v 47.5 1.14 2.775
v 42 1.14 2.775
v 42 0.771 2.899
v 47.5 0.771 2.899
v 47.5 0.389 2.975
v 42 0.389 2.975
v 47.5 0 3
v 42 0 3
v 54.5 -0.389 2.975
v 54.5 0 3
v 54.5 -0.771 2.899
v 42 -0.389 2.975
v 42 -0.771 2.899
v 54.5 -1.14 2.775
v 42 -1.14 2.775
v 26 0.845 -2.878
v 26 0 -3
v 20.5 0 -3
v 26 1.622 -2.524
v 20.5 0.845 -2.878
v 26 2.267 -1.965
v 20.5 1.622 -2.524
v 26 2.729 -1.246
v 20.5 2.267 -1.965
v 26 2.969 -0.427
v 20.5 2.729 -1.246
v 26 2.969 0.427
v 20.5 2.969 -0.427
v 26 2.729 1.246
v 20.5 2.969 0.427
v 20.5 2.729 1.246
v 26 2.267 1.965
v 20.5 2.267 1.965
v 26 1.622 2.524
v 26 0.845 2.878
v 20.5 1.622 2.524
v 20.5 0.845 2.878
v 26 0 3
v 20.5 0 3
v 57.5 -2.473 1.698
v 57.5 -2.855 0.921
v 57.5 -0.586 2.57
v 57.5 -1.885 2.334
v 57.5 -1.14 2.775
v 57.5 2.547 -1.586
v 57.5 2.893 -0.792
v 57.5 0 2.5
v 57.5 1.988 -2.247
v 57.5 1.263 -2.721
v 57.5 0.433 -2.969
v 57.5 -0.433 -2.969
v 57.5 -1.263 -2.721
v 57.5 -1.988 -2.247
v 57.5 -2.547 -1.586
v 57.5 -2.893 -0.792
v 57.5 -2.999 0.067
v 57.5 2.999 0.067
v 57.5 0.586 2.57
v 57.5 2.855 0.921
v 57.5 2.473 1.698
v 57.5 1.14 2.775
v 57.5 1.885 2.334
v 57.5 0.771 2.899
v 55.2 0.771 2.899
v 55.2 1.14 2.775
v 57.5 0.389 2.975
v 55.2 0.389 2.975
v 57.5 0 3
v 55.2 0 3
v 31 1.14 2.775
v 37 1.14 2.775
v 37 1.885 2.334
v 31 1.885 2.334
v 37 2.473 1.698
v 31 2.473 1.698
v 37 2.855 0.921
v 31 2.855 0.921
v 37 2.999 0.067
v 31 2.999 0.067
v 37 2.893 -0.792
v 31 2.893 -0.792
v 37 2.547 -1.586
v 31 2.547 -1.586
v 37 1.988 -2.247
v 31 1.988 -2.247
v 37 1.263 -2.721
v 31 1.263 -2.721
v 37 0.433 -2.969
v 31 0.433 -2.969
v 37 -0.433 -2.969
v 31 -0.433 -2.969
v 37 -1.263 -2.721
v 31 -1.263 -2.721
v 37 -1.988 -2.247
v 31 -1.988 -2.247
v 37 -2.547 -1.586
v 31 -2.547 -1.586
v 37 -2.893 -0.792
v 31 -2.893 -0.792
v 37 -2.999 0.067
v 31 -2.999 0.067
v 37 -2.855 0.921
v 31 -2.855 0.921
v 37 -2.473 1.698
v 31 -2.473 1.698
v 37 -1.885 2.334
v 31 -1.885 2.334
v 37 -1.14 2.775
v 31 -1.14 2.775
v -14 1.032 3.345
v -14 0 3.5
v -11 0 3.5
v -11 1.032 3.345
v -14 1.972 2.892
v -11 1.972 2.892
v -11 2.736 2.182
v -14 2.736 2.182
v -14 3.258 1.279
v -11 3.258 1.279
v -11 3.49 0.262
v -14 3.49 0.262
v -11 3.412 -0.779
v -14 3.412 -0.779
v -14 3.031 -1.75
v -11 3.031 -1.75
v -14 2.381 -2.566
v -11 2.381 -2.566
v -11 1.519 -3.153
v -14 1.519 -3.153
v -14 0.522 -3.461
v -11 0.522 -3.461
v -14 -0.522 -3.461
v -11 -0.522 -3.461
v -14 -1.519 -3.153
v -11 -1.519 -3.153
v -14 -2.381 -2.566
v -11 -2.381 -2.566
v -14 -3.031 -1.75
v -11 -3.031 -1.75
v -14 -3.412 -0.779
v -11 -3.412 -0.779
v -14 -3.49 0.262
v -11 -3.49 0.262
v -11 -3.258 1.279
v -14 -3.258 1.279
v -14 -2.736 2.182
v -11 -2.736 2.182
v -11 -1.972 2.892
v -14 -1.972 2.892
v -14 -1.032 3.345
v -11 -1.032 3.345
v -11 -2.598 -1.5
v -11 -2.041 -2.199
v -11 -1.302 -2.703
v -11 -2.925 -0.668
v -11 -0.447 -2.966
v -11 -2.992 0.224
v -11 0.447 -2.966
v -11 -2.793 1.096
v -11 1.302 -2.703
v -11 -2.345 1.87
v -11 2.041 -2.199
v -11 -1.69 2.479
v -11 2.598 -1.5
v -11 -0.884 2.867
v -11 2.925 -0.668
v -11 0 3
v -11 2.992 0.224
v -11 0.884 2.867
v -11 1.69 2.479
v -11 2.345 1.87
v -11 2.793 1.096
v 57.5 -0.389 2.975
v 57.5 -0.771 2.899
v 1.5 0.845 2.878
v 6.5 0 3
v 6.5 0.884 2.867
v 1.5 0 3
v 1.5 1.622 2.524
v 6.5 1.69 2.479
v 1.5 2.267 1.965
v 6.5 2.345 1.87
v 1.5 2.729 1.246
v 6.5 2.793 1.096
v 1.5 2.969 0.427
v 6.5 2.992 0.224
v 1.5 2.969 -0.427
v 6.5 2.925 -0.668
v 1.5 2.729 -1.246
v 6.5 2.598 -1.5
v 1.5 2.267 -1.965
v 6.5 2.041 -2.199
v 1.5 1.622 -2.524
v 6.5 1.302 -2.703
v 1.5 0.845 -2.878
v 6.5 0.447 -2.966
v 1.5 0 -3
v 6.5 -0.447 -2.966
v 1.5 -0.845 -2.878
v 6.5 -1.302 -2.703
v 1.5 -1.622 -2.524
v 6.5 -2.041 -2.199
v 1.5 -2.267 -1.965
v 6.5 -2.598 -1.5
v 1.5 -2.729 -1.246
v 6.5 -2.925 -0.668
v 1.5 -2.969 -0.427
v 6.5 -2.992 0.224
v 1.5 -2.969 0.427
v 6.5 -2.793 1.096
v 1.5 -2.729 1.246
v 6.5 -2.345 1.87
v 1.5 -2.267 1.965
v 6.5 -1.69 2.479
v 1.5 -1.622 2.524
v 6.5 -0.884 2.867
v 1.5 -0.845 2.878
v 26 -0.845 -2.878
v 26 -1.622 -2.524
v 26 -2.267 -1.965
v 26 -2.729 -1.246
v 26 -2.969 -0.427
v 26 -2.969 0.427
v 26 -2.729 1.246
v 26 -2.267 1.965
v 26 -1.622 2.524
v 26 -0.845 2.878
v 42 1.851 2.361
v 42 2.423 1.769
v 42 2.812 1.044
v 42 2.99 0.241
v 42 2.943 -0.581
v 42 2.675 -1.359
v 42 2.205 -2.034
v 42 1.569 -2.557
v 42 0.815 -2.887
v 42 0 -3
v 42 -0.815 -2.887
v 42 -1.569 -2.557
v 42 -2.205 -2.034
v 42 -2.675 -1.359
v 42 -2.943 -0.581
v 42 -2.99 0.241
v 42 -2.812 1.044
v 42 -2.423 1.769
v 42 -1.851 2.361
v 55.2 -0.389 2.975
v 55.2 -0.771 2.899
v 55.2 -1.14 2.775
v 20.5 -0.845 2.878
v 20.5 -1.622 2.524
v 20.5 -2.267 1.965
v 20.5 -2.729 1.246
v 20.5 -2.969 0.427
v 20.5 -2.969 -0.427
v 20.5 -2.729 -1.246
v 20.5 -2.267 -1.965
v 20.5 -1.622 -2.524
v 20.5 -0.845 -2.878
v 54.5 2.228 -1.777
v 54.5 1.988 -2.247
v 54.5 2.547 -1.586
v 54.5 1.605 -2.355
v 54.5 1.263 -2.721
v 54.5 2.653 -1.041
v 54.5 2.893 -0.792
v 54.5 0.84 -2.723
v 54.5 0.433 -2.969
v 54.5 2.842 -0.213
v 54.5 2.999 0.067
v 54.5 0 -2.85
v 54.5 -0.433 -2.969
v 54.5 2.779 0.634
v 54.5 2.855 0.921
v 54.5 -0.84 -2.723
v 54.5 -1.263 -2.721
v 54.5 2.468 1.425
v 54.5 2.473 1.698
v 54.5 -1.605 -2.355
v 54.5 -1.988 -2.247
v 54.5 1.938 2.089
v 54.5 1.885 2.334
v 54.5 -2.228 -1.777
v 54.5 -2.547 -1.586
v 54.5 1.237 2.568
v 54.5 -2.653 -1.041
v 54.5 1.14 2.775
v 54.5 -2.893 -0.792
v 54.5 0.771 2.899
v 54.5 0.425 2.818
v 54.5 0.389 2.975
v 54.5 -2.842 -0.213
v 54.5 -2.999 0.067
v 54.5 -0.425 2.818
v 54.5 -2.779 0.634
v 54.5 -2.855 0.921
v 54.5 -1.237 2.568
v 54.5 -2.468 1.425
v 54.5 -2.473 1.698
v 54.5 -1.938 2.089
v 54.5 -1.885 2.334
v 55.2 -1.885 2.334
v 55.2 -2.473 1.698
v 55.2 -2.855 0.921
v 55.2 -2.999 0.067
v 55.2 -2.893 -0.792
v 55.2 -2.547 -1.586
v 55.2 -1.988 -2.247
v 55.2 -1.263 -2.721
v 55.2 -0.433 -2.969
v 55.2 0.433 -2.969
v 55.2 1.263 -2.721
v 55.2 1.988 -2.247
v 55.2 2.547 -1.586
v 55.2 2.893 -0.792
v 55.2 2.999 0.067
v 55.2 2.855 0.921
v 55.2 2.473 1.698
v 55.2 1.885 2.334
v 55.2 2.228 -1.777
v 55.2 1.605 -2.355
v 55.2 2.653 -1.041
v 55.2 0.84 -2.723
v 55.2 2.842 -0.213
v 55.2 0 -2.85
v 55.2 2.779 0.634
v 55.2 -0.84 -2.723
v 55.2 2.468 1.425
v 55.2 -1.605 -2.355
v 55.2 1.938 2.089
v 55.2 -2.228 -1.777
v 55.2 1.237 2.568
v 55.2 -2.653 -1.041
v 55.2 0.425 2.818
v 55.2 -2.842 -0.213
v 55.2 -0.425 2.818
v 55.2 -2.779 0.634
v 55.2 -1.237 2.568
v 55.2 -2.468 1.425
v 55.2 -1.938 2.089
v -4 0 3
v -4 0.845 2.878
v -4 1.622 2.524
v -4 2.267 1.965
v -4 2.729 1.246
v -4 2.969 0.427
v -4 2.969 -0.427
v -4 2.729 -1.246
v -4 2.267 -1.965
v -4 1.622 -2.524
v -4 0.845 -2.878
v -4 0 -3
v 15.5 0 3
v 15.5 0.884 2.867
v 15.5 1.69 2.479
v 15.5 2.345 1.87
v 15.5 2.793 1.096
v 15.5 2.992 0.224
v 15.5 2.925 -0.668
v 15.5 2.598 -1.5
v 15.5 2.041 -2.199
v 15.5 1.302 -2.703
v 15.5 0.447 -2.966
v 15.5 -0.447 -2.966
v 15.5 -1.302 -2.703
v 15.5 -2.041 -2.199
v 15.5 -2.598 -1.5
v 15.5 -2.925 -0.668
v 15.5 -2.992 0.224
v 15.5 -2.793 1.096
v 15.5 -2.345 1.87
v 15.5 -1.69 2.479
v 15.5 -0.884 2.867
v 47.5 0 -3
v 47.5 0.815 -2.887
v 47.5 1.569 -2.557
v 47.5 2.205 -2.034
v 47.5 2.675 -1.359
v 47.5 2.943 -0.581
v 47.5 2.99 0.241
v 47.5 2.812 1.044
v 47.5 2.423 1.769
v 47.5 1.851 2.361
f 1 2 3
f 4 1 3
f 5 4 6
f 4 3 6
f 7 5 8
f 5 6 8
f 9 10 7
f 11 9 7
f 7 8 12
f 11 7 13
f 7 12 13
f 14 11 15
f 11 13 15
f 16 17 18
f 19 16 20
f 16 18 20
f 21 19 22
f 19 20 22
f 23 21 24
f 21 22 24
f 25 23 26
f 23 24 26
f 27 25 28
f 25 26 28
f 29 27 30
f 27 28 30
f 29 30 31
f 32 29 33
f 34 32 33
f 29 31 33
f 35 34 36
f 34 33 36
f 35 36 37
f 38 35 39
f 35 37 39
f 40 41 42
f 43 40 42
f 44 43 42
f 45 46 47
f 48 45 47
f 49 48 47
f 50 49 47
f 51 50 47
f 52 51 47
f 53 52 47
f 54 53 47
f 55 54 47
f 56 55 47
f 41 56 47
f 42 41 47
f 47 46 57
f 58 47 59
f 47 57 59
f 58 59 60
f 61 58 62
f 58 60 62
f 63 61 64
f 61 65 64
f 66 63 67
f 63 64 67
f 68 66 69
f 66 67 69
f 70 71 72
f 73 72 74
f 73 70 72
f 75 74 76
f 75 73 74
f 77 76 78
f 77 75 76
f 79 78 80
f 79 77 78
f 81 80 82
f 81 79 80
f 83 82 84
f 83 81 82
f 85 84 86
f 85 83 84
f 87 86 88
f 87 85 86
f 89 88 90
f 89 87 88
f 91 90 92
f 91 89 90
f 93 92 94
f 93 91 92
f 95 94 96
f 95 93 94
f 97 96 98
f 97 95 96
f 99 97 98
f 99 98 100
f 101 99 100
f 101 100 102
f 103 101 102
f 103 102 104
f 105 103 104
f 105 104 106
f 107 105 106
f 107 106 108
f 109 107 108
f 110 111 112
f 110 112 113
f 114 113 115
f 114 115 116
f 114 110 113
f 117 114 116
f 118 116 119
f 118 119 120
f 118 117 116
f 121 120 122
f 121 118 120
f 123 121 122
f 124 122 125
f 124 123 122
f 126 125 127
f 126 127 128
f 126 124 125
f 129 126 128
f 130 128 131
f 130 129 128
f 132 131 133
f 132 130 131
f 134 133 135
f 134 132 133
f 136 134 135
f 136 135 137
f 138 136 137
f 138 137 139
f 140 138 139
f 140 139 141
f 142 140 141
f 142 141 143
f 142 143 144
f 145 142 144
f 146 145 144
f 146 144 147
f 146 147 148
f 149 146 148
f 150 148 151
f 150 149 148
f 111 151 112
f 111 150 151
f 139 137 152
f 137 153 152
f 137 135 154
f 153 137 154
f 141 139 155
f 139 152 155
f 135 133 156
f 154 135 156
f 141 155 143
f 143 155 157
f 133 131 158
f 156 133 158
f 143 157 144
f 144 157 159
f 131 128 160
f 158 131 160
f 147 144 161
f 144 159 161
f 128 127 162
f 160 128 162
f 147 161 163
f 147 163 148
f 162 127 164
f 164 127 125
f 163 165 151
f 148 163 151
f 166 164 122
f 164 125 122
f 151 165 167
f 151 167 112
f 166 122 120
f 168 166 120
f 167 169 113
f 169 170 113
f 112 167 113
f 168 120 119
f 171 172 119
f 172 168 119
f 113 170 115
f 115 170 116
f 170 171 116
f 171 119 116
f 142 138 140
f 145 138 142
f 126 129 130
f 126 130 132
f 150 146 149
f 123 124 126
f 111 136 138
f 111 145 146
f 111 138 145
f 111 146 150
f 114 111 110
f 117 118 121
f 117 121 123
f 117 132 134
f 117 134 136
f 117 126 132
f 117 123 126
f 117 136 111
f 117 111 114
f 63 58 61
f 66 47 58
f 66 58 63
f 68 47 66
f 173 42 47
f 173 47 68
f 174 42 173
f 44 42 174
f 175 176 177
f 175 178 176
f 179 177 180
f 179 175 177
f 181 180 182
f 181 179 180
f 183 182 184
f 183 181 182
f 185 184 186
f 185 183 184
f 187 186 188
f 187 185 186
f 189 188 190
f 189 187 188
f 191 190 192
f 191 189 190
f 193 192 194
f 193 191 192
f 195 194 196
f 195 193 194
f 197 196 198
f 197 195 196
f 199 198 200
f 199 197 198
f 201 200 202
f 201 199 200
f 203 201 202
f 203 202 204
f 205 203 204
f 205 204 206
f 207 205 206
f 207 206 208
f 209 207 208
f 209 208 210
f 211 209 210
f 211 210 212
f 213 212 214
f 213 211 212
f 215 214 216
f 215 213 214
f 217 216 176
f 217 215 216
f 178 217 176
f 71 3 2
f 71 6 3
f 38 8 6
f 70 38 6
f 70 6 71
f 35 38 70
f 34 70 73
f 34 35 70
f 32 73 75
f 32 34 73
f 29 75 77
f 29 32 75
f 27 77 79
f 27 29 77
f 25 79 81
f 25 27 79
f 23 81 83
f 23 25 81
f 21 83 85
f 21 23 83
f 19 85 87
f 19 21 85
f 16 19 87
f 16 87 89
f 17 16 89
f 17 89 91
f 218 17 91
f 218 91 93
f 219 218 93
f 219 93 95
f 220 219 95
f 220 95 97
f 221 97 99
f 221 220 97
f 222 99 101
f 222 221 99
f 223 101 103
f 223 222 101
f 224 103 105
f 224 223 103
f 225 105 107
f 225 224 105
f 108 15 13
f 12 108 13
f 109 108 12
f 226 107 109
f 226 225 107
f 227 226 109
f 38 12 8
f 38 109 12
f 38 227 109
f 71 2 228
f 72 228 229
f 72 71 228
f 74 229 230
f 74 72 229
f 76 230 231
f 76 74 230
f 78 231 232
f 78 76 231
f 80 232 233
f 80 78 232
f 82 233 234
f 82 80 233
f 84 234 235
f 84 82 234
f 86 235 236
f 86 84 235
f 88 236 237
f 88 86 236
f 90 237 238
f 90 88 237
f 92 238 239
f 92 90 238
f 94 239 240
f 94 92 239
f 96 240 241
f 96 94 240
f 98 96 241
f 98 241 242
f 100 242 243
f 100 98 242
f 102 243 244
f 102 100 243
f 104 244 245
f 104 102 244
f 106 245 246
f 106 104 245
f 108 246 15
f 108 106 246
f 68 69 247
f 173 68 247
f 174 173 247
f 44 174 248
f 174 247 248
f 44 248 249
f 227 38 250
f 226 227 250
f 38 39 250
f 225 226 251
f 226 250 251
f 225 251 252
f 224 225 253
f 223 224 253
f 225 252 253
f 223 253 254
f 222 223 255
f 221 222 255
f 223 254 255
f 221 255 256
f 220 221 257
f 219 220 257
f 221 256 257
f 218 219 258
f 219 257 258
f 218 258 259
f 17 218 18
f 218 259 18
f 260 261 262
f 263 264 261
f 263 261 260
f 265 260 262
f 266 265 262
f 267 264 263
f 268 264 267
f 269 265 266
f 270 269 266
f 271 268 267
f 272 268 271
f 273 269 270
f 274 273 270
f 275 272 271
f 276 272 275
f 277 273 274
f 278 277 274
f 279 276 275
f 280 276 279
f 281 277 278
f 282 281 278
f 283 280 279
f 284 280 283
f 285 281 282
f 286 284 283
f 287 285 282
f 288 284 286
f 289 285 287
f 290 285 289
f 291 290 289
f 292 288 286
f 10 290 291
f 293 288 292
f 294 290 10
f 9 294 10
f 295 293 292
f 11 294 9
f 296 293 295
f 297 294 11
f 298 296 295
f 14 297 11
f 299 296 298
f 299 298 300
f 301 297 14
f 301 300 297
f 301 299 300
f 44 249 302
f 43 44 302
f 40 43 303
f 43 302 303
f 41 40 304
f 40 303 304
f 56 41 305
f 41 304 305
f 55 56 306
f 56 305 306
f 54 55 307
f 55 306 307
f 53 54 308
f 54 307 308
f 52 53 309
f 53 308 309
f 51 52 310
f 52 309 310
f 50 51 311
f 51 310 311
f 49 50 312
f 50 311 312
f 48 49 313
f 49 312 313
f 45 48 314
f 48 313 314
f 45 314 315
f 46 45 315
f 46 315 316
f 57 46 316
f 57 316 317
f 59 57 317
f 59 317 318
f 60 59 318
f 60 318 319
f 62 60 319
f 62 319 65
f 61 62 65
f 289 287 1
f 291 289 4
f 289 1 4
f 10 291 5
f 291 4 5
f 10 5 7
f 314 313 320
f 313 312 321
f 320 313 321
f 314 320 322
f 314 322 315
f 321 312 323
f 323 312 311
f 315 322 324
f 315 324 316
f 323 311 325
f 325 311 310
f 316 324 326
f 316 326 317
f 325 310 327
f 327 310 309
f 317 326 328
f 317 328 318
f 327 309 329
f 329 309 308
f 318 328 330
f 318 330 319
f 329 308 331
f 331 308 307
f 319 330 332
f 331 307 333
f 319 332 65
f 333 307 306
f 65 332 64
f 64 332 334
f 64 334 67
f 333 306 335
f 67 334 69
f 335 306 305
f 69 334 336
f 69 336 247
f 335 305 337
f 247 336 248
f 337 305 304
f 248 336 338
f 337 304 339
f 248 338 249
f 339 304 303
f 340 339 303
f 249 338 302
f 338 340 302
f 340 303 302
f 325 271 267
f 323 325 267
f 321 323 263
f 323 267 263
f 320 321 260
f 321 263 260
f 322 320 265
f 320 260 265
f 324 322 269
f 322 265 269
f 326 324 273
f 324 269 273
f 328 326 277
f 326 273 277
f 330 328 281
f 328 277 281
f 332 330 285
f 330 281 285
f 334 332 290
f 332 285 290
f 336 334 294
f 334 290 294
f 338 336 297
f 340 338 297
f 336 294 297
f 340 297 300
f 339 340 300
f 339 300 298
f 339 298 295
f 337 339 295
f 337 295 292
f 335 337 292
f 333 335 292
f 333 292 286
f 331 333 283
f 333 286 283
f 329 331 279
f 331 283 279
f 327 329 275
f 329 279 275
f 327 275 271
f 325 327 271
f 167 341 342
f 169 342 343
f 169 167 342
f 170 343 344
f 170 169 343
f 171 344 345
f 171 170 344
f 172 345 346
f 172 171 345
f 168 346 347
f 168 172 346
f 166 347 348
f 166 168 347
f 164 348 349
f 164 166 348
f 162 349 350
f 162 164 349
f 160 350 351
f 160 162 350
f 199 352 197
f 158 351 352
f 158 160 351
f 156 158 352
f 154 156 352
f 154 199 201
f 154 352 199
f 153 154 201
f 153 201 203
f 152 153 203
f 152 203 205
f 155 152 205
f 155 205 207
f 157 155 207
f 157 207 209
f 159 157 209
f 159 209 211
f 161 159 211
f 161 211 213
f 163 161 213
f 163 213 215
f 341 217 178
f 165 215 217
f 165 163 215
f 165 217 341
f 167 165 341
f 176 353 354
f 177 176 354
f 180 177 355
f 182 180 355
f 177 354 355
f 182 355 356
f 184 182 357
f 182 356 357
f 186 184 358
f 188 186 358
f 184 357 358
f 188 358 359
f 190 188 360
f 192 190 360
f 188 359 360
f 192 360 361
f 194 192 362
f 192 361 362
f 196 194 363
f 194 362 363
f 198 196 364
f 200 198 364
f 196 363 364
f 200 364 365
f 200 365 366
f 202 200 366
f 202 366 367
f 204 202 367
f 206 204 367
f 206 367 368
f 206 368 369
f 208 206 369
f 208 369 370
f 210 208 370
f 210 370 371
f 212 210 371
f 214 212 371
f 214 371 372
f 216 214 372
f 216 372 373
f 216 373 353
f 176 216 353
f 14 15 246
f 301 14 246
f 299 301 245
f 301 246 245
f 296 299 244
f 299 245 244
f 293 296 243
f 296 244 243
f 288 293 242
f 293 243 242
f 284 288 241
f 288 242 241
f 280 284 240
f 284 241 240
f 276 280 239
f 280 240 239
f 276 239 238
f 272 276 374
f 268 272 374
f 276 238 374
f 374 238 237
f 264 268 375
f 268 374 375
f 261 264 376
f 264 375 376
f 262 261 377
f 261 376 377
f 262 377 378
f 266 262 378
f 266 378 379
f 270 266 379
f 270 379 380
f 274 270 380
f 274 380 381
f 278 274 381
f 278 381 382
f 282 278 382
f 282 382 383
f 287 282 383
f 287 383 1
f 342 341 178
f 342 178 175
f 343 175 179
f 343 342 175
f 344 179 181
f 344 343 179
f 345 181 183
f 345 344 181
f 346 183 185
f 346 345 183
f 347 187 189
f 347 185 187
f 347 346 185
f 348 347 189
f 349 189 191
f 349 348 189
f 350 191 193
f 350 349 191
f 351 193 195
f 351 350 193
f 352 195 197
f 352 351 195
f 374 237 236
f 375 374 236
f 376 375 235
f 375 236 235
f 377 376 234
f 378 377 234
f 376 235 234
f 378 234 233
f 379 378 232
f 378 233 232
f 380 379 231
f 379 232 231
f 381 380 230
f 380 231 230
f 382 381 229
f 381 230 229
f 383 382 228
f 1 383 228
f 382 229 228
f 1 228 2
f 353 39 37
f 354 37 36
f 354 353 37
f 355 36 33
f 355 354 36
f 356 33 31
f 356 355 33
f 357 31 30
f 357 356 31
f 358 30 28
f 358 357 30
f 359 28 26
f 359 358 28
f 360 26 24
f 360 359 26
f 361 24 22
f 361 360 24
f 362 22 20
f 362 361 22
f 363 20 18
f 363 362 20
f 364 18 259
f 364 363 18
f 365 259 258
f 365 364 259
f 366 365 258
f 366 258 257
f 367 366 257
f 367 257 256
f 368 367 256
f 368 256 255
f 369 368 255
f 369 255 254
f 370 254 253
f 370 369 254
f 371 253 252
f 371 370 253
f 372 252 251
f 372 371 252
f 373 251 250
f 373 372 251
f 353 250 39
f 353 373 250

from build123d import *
from build123d.topology import SkipClean

# Parameters (mm, degrees)
SKETCH_2_R          = 3
EXTRUDE_1_DEPTH     = 4
EXTRUDE_2_DEPTH     = 2.5
SKETCH_5_R          = 2.5
EXTRUDE_3_DEPTH     = 9
MIRROR_START        = 15.5
MIRROR_1_DEPTH      = 0.381197772
MIRROR_START_2      = 15.881197772
MIRROR_1_2_DEPTH    = 4.618802228
EXTRUDE_4_DEPTH     = 5
SKETCH_10_R         = 2.5
EXTRUDE_5_DEPTH     = 6
SKETCH_11_R         = 3
EXTRUDE_6_DEPTH     = 5.5
EXTRUDE_START       = 10
SKETCH_12_R         = 3
EXTRUDE_8_DEPTH     = 10
SKETCH_13_R         = 3
EXTRUDE_9_DEPTH     = 10
SKETCH_14_OUTSIDE_W = 32.048
SKETCH_14_OUTSIDE_H = 35.048
SKETCH_14_OUTSIDE_R = 3
CUT_EXTRUDE_2_DEPTH = 59.352377883
SKETCH_15_R         = 3
EXTRUDE_10_DEPTH    = 29.5
EXTRUDE_11_DEPTH    = 26.5
SKETCH_18_R         = 3.5
EXTRUDE_12_DEPTH    = 3
CUT_EXTRUDE_START   = -3
SKETCH_19_R         = 3
SKETCH_19_R_2       = 2.85
CUT_EXTRUDE_3_DEPTH = 0.7


with BuildPart() as part:
    # 草图2 → 凸台-拉伸1 (new, symmetric)
    with BuildSketch(Plane(origin=(0, 0, 0), x_dir=(0, 0, -1), z_dir=(1, 0, 0))):
        Circle(SKETCH_2_R)
    extrude_1 = extrude(amount=EXTRUDE_1_DEPTH, both=True)

    # 草图3 → 凸台-拉伸2 (add, symmetric)
    with BuildSketch(Plane(origin=(4, 0, 0), x_dir=(0, 0, -1), z_dir=(1, 0, 0))):
        with BuildLine():
            Line((5, 0), (5, -8))
            ThreePointArc((5, -8), (0, -13), (-5, -8))
            Line((-5, -8), (-5, 0))
            ThreePointArc((-5, 0), (0, 5), (5, 0))
        make_face()
    extrude(amount=EXTRUDE_2_DEPTH, both=True)

    # 切除-旋转1: read off the stored shape, not the designer's step
    # 切除-旋转1 outline → 切除-旋转1 (revolve, cut)
    with BuildSketch(Plane.YX):
        Polygon((13.0002322, 6.118936215), (4.99999958, 1.499999757), (13.0002322, 1.499999757), align=None)
    revolve(axis=Axis((0, 0, 0), (1, 0, 0)), mode=Mode.SUBTRACT)

    # 草图5 → 凸台-拉伸3 (add)
    with BuildSketch(Plane(origin=(6.5, 0, 0), x_dir=(0, 0, -1), z_dir=(1, 0, 0))):
        with Locations((0, -8)):
            Circle(SKETCH_5_R)
    extrude(amount=EXTRUDE_3_DEPTH)

    # 镜向1: read off the stored shape, not the designer's step
    # 镜向1 outline → 镜向1 (add)
    with BuildSketch(Plane.YZ.offset(MIRROR_START)):
        with BuildLine():
            Line((-8, -5), (0, -5))
            ThreePointArc((0, -5), (5, 0), (0, 5))
            Line((0, 5), (-7.999999997, 5))
            ThreePointArc((-7.999999997, 5), (-13, 2e-09), (-8, -5))
        make_face()
    extrude(amount=MIRROR_1_DEPTH)

    # Mirror 1 2 outline → Mirror 1 2 (add)
    with BuildSketch(Plane.YZ.offset(MIRROR_START_2)):
        with BuildLine():
            Line((-8, -5), (0, -5))
            ThreePointArc((0, -5), (5, 0), (0, 5))
            Line((0, 5), (-7.999999997, 5))
            ThreePointArc((-7.999999997, 5), (-13, 2e-09), (-8, -5))
        make_face()
    extrude(amount=MIRROR_1_2_DEPTH)

    # Mirror 1 3 outline → Mirror 1 3 (revolve, cut)
    with BuildSketch(Plane.YX):
        Polygon((13.0002322, 20.500000243), (4.99999958, 20.500000243), (13.0002322, 15.881063785), align=None)
    revolve(axis=Axis((0, 0, 0), (1, 0, 0)), mode=Mode.SUBTRACT)

    # 镜向2: 凸台-拉伸1 across plane
    add(extrude_1.mirror(Plane(origin=(11, 0, 0), x_dir=(0, 0, 1), z_dir=(1, 0, 0))))

    # 草图6 → 凸台-拉伸4 (add)
    with BuildSketch(Plane(origin=(26, 0, 0), x_dir=(0, 0, -1), z_dir=(1, 0, 0))):
        with BuildLine():
            Line((0, -5), (-5, -5))
            ThreePointArc((-5, -5), (-10, 0), (-5, 5))
            Line((-5, 5), (0, 5))
            ThreePointArc((0, 5), (5, 0), (0, -5))
        make_face()
    extrude_4 = extrude(amount=EXTRUDE_4_DEPTH)

    # 切除-旋转2: read off the stored shape, not the designer's step
    # 切除-旋转2 outline → 切除-旋转2 (revolve, cut)
    with BuildSketch(Plane.YX):
        Polygon((10.000264544, 30.195720135), (5, 26), (10.000264544, 26), align=None)
    cut_revolve_2 = revolve(axis=Axis((0, 0, 0), (1, 0, 0)), mode=Mode.SUBTRACT)

    # 草图10 → 凸台-拉伸5 (add)
    with BuildSketch(Plane(origin=(31, 0, 0), x_dir=(0, 0, -1), z_dir=(1, 0, 0))):
        with Locations((-5, 0)):
            Circle(SKETCH_10_R)
    extrude(amount=EXTRUDE_5_DEPTH)

    # 镜向3: 凸台-拉伸4, 切除-旋转2 across plane
    add(extrude_4.mirror(Plane(origin=(34, 0, 0), x_dir=(0, 0, 1), z_dir=(1, 0, 0))))
    add(cut_revolve_2.mirror(Plane(origin=(34, 0, 0), x_dir=(0, 0, 1), z_dir=(1, 0, 0))), mode=Mode.SUBTRACT)

    # 草图11 → 凸台-拉伸6 (add)
    with BuildSketch(Plane(origin=(42, 0, 0), x_dir=(0, 0, -1), z_dir=(1, 0, 0))):
        Circle(SKETCH_11_R)
    extrude(amount=EXTRUDE_6_DEPTH)

    # 草图12 → 凸台-拉伸8 (add)
    with BuildSketch(Plane.ZY.offset(4).offset(EXTRUDE_START)):
        Circle(SKETCH_12_R)
    extrude(amount=-EXTRUDE_8_DEPTH)

    # 草图13 → 凸台-拉伸9 (add)
    with BuildSketch(Plane(origin=(47.5, 0, 0), x_dir=(0, 0, -1), z_dir=(1, 0, 0))):
        with Locations(Location((0, 0, 0), (0, 0, 180))):
            Circle(SKETCH_13_R)
    extrude(amount=EXTRUDE_9_DEPTH)

    # 草图14 outside → 切除-拉伸2 (cut, through all)
    with SkipClean():  # the faces are left unmerged after this step: merging them gives an invalid solid
        with BuildSketch(Plane.ZY.offset(-1.5)):
            with Locations((2.5, -4)):
                Rectangle(SKETCH_14_OUTSIDE_W, SKETCH_14_OUTSIDE_H)
            Circle(SKETCH_14_OUTSIDE_R, mode=Mode.SUBTRACT)
        extrude(amount=-CUT_EXTRUDE_2_DEPTH, mode=Mode.SUBTRACT)


with BuildPart() as cut_extrude_2_piece_1:
    # of the separate pieces the step leaves, piece 1, a body of its own (cut_extrude_2_pieces)
    add(part.part.solids().sort_by_distance((37, -1.139901312, 2.775))[0])



with BuildPart() as cut_extrude_2_piece_2:
    # of the separate pieces the step leaves, piece 2, a body of its own (cut_extrude_2_pieces)
    add(part.part.solids().sort_by_distance((6.5, 0, 3))[0])


with BuildPart() as cut_extrude_2_piece_1_1:
    with SkipClean():  # the faces are left unmerged after this step: merging them gives an invalid solid
        add(cut_extrude_2_piece_1.part)

        add(cut_extrude_2_piece_2.part)  # 凸台-拉伸10 merges 切除-拉伸2 piece 2
        # 草图15 → 凸台-拉伸10 (add)
        with BuildSketch(Plane.ZY.offset(-15.5)):
            Circle(SKETCH_15_R)
        extrude(amount=EXTRUDE_10_DEPTH)

    # 草图16 → 凸台-拉伸11 (add)
    with BuildSketch(Plane(origin=(31, 0, 0), x_dir=(0, 0, -1), z_dir=(1, 0, 0))):
        with BuildLine():
            ThreePointArc((-2.775, -1.139901312), (-2.5, 0), (-2.775, 1.139901312))
            ThreePointArc((-2.775, 1.139901312), (3, 0), (-2.775, -1.139901312))
        make_face()
    extrude(amount=EXTRUDE_11_DEPTH)

    # 草图18 → 凸台-拉伸12 (add)
    with BuildSketch(Plane.ZY.offset(14)):
        Circle(SKETCH_18_R)
    extrude(amount=-EXTRUDE_12_DEPTH)

    # 草图19 → 切除-拉伸3 (cut)
    with BuildSketch(Plane(origin=(57.5, 0, 0), x_dir=(0, 0, -1), z_dir=(1, 0, 0)).offset(CUT_EXTRUDE_START)):
        with Locations(Location((0, 0, 0), (0, 0, 180))):
            Circle(SKETCH_19_R)
        Circle(SKETCH_19_R_2, mode=Mode.SUBTRACT)
    extrude(amount=CUT_EXTRUDE_3_DEPTH, mode=Mode.SUBTRACT)


solid = cut_extrude_2_piece_1_1.part
